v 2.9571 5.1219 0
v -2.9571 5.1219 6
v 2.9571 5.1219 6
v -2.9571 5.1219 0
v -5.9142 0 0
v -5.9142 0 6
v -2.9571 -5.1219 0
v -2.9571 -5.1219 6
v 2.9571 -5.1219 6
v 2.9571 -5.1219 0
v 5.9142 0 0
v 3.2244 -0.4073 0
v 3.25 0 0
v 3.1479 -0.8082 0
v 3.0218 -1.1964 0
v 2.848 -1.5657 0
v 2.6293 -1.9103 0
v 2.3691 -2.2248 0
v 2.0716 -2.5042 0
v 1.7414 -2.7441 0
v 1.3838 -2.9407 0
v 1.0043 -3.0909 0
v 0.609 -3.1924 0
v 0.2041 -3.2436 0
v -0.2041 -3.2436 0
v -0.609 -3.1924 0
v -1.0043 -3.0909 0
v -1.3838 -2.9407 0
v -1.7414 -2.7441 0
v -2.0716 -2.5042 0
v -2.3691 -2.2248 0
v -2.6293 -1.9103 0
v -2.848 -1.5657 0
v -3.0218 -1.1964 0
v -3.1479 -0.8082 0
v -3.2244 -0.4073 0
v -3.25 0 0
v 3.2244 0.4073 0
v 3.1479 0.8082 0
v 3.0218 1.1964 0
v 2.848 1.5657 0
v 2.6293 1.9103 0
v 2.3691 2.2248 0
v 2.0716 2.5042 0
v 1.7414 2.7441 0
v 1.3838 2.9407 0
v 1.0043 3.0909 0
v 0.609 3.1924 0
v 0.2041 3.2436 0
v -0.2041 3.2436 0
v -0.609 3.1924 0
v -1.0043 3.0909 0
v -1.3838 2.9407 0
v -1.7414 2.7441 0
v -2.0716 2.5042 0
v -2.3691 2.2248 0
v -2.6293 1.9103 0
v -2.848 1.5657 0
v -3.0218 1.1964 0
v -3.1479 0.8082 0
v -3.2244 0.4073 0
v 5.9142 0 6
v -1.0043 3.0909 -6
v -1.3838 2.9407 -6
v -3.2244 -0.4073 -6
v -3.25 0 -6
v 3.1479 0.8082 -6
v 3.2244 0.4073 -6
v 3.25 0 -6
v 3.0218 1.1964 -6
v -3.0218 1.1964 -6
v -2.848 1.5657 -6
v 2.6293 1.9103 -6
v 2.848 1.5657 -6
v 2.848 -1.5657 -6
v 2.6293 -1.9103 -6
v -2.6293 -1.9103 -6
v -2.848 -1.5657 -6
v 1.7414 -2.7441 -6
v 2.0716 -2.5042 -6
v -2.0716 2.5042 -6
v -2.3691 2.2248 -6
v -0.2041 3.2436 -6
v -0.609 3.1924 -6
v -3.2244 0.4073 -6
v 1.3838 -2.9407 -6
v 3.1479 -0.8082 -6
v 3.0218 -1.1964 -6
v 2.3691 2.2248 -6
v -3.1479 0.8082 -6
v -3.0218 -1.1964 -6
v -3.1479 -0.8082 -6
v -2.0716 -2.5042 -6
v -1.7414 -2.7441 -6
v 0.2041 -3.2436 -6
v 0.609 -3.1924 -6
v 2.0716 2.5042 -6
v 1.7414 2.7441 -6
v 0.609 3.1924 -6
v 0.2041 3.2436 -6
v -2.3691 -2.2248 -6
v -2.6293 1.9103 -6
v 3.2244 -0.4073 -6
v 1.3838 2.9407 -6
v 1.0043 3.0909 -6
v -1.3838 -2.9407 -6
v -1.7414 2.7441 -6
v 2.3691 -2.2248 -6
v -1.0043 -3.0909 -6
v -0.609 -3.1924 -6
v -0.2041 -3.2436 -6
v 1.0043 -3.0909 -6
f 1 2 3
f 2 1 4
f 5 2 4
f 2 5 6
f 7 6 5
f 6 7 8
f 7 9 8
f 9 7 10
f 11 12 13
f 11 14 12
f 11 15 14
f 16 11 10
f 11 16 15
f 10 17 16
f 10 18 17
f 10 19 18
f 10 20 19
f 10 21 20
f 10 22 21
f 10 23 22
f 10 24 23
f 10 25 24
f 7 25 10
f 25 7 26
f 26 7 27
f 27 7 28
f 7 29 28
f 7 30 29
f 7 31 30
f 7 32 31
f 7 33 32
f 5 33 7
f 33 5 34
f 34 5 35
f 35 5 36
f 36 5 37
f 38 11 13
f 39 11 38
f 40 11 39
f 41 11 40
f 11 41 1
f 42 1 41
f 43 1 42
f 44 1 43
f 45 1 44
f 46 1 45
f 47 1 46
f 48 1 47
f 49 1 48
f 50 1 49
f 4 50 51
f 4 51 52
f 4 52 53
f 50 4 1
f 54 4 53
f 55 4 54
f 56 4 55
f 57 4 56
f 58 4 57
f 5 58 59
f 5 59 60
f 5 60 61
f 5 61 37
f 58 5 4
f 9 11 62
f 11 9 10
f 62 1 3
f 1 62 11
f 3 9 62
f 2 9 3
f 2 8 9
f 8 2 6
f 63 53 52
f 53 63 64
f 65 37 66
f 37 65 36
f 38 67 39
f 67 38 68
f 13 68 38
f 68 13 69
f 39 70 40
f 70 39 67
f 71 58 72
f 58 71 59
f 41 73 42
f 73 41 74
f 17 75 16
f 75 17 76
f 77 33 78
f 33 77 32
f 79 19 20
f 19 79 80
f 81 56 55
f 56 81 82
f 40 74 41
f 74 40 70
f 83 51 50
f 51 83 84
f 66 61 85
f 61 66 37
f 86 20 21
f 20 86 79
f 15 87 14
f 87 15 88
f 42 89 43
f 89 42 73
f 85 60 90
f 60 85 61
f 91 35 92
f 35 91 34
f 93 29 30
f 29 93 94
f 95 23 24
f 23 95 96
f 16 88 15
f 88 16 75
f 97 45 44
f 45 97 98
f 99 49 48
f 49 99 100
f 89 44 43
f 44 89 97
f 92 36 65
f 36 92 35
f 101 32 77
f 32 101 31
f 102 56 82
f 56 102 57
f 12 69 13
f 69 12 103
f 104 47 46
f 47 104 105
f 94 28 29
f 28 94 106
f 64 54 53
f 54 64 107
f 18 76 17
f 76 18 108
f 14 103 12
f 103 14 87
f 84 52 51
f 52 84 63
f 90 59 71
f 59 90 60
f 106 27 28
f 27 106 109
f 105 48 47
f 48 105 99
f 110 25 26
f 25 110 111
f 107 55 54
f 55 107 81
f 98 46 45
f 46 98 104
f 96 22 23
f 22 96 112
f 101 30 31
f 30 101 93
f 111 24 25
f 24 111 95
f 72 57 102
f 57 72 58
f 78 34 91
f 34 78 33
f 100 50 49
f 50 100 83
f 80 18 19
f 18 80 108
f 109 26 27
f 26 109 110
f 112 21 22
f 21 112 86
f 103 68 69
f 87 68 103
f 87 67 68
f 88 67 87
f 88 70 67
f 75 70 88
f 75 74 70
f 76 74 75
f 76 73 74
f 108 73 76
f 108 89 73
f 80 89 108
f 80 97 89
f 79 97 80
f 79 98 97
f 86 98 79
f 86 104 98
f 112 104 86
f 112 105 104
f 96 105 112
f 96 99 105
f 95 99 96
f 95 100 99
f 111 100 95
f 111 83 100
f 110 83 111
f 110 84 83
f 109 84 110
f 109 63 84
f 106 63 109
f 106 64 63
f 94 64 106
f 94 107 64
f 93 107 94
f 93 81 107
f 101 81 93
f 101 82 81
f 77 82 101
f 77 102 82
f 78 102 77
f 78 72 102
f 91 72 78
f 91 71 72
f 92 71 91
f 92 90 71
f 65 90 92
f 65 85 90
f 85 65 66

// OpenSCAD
$fn = 50;


difference() {
	union() {
		linear_extrude(height = 6) {
			polygon(points = [[5.9142500000, 0.0000000000], [2.9571250000, 5.1218907443], [-2.9571250000, 5.1218907443], [-5.9142500000, 0.0000000000], [-2.9571250000, -5.1218907443], [2.9571250000, -5.1218907443]]);
		}
		translate(v = [0, 0, -6]) {
			cylinder(h = 6, r = 3.2500000000);
		}
	}
	union();
}
